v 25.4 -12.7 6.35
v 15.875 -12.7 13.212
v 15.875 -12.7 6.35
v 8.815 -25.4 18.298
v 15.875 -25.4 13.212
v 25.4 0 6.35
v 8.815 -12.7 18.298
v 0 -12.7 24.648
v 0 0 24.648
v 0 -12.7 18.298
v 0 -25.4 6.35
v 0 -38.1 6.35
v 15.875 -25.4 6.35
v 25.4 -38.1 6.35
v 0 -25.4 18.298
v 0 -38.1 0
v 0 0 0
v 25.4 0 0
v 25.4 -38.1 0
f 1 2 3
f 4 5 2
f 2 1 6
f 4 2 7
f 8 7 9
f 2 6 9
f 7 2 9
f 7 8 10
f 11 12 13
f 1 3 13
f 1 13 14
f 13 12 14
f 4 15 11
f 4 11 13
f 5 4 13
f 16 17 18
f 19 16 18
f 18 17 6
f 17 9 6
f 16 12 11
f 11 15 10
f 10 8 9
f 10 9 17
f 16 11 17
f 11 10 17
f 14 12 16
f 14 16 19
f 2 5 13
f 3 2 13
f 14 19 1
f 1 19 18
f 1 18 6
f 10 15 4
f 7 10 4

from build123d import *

# Parameters (mm, degrees)
F0_W     = 25.4
F0_H     = 6.35
F1_DEPTH = 38.1
F3_DEPTH = 12.7
F5_DEPTH = 12.7
F7_DEPTH = 12.7


with BuildPart() as f1:
    # F0 (on Front) → F1 (new body)
    with BuildSketch(Plane.XZ):
        with Locations((12.7, 3.175)):
            Rectangle(F0_W, F0_H)
        Polygon((0, 24.647629), (0, 6.35), (25.4, 6.35), align=None)
    extrude(amount=F1_DEPTH)

    # F2 (on face) → F3 (cut)
    with BuildSketch(Plane.XZ.offset(38.1)):
        Polygon((0, 6.35), (25.4, 6.35), (0, 24.647629), align=None)
    extrude(amount=-F3_DEPTH, mode=Mode.SUBTRACT)

    # F4 (on face) → F5 (cut)
    with BuildSketch(Plane.XZ.offset(25.4)):
        Polygon((8.814803, 18.297629), (0, 24.647629), (0, 18.297629), align=None)
    extrude(amount=-F5_DEPTH, mode=Mode.SUBTRACT)

    # F6 (on face) → F7 (cut)
    with BuildSketch(Plane.XZ.offset(25.4)):
        Polygon((15.875, 6.35), (25.4, 6.35), (15.875, 13.211611), align=None)
    extrude(amount=-F7_DEPTH, mode=Mode.SUBTRACT)


solid = f1.part
